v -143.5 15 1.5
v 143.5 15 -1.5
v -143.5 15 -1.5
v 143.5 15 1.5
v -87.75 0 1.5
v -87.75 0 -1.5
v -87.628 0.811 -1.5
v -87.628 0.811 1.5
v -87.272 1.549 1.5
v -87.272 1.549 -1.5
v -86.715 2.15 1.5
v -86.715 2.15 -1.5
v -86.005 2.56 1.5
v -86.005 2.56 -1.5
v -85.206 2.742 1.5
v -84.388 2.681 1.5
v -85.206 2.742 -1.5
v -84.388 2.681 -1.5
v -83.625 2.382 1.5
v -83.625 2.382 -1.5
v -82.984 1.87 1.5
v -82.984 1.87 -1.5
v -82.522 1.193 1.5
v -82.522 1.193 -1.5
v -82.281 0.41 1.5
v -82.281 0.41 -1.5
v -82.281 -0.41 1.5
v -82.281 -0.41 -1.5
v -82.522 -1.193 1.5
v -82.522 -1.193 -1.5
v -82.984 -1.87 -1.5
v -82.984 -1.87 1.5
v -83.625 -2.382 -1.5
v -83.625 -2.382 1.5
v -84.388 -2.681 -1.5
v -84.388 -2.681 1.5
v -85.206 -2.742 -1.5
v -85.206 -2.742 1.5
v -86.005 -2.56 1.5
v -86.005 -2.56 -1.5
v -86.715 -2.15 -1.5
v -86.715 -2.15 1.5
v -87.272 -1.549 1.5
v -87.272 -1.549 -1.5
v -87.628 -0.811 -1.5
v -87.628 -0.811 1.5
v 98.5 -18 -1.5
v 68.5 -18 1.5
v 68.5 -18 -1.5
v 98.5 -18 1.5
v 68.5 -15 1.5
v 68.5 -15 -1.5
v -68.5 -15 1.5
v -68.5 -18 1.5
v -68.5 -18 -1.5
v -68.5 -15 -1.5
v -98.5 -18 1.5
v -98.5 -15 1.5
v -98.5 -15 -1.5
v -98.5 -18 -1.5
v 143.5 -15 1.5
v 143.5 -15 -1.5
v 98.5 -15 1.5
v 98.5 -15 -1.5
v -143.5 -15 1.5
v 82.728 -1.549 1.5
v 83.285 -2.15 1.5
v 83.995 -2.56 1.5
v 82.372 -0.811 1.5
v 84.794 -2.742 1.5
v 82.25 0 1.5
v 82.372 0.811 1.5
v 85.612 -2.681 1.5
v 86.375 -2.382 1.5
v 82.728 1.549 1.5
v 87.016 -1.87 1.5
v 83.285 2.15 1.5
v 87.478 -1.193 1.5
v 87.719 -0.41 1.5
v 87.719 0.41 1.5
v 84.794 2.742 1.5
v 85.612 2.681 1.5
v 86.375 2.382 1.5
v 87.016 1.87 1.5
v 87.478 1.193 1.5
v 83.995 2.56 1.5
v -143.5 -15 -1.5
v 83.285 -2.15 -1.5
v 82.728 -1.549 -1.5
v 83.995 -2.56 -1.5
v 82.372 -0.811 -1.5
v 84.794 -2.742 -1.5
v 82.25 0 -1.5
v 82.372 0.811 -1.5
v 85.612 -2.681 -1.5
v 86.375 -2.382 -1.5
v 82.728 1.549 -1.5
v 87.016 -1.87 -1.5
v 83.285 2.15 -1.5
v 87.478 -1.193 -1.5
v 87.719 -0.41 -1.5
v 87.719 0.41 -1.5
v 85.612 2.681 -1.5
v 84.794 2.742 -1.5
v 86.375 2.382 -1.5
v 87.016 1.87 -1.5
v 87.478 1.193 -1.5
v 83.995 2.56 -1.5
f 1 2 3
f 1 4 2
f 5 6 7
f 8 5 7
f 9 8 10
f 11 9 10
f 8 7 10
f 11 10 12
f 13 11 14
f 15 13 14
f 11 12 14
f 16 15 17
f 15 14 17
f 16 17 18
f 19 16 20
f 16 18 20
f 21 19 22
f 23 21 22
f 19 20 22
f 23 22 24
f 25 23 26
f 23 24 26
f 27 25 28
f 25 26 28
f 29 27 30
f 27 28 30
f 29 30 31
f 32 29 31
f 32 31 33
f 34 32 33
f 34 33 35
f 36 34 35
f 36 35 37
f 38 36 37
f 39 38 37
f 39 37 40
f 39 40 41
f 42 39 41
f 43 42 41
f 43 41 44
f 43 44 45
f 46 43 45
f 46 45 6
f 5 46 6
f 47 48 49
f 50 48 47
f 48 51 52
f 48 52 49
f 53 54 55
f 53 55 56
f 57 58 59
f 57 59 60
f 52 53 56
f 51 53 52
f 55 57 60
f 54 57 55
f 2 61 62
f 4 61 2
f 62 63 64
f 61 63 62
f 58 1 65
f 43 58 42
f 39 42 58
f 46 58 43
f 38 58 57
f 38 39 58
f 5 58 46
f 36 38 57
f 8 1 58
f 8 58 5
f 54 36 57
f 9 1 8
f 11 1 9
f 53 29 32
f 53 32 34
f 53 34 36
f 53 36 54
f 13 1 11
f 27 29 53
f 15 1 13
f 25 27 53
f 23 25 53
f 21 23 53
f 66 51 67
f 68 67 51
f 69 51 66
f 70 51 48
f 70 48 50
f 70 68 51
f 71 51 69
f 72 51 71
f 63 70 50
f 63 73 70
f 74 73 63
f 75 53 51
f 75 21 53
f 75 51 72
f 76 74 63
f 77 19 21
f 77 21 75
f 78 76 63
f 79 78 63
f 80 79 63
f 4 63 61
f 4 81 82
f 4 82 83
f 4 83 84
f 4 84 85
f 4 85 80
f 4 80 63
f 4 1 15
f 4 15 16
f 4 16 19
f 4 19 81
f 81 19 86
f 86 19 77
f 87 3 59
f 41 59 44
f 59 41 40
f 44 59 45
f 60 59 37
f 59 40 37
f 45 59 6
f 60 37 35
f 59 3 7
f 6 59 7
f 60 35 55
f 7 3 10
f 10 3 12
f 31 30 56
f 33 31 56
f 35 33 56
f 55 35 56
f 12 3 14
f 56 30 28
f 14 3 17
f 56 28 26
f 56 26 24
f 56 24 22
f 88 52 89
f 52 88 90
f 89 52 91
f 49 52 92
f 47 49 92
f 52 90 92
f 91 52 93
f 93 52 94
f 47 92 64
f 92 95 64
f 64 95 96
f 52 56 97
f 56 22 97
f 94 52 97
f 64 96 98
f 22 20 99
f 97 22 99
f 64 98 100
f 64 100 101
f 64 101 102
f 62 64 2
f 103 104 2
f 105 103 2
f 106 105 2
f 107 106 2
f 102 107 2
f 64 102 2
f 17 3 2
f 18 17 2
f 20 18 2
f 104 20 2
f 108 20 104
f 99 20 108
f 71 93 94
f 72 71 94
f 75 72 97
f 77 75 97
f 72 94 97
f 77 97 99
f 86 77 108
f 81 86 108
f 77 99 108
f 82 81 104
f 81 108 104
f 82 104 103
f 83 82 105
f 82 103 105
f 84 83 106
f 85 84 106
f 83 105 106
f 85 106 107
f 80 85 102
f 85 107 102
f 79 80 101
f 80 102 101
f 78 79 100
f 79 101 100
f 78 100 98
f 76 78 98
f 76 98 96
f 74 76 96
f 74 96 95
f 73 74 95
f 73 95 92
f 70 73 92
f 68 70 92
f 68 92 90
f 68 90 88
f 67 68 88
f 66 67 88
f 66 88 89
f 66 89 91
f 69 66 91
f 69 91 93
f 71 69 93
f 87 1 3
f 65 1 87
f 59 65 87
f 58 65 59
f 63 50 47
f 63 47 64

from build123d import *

# Parameters (mm, degrees)
SALIENTE_EXTRUIR1_DEPTH      = 1.5
TALADRO_DE_MARGEN_PARA_M51_D = 5.5


with BuildPart() as part:
    # Croquis1 → Saliente-Extruir1 (new, symmetric)
    with BuildSketch(Plane.XY):
        Polygon((-143.5, -15), (-98.5, -15), (-98.5, -18), (-68.5, -18), (-68.5, -15), (68.5, -15), (68.5, -18), (98.5, -18), (98.5, -15), (143.5, -15), (143.5, 15), (-143.5, 15), align=None)
    extrude(amount=SALIENTE_EXTRUIR1_DEPTH, both=True)

    # Taladro de margen para M51 (through all)
    with Locations(Plane.XY.offset(1.5)):
        with Locations((-85, 0), (85, 0)):
            Hole(TALADRO_DE_MARGEN_PARA_M51_D / 2)


solid = part.part
